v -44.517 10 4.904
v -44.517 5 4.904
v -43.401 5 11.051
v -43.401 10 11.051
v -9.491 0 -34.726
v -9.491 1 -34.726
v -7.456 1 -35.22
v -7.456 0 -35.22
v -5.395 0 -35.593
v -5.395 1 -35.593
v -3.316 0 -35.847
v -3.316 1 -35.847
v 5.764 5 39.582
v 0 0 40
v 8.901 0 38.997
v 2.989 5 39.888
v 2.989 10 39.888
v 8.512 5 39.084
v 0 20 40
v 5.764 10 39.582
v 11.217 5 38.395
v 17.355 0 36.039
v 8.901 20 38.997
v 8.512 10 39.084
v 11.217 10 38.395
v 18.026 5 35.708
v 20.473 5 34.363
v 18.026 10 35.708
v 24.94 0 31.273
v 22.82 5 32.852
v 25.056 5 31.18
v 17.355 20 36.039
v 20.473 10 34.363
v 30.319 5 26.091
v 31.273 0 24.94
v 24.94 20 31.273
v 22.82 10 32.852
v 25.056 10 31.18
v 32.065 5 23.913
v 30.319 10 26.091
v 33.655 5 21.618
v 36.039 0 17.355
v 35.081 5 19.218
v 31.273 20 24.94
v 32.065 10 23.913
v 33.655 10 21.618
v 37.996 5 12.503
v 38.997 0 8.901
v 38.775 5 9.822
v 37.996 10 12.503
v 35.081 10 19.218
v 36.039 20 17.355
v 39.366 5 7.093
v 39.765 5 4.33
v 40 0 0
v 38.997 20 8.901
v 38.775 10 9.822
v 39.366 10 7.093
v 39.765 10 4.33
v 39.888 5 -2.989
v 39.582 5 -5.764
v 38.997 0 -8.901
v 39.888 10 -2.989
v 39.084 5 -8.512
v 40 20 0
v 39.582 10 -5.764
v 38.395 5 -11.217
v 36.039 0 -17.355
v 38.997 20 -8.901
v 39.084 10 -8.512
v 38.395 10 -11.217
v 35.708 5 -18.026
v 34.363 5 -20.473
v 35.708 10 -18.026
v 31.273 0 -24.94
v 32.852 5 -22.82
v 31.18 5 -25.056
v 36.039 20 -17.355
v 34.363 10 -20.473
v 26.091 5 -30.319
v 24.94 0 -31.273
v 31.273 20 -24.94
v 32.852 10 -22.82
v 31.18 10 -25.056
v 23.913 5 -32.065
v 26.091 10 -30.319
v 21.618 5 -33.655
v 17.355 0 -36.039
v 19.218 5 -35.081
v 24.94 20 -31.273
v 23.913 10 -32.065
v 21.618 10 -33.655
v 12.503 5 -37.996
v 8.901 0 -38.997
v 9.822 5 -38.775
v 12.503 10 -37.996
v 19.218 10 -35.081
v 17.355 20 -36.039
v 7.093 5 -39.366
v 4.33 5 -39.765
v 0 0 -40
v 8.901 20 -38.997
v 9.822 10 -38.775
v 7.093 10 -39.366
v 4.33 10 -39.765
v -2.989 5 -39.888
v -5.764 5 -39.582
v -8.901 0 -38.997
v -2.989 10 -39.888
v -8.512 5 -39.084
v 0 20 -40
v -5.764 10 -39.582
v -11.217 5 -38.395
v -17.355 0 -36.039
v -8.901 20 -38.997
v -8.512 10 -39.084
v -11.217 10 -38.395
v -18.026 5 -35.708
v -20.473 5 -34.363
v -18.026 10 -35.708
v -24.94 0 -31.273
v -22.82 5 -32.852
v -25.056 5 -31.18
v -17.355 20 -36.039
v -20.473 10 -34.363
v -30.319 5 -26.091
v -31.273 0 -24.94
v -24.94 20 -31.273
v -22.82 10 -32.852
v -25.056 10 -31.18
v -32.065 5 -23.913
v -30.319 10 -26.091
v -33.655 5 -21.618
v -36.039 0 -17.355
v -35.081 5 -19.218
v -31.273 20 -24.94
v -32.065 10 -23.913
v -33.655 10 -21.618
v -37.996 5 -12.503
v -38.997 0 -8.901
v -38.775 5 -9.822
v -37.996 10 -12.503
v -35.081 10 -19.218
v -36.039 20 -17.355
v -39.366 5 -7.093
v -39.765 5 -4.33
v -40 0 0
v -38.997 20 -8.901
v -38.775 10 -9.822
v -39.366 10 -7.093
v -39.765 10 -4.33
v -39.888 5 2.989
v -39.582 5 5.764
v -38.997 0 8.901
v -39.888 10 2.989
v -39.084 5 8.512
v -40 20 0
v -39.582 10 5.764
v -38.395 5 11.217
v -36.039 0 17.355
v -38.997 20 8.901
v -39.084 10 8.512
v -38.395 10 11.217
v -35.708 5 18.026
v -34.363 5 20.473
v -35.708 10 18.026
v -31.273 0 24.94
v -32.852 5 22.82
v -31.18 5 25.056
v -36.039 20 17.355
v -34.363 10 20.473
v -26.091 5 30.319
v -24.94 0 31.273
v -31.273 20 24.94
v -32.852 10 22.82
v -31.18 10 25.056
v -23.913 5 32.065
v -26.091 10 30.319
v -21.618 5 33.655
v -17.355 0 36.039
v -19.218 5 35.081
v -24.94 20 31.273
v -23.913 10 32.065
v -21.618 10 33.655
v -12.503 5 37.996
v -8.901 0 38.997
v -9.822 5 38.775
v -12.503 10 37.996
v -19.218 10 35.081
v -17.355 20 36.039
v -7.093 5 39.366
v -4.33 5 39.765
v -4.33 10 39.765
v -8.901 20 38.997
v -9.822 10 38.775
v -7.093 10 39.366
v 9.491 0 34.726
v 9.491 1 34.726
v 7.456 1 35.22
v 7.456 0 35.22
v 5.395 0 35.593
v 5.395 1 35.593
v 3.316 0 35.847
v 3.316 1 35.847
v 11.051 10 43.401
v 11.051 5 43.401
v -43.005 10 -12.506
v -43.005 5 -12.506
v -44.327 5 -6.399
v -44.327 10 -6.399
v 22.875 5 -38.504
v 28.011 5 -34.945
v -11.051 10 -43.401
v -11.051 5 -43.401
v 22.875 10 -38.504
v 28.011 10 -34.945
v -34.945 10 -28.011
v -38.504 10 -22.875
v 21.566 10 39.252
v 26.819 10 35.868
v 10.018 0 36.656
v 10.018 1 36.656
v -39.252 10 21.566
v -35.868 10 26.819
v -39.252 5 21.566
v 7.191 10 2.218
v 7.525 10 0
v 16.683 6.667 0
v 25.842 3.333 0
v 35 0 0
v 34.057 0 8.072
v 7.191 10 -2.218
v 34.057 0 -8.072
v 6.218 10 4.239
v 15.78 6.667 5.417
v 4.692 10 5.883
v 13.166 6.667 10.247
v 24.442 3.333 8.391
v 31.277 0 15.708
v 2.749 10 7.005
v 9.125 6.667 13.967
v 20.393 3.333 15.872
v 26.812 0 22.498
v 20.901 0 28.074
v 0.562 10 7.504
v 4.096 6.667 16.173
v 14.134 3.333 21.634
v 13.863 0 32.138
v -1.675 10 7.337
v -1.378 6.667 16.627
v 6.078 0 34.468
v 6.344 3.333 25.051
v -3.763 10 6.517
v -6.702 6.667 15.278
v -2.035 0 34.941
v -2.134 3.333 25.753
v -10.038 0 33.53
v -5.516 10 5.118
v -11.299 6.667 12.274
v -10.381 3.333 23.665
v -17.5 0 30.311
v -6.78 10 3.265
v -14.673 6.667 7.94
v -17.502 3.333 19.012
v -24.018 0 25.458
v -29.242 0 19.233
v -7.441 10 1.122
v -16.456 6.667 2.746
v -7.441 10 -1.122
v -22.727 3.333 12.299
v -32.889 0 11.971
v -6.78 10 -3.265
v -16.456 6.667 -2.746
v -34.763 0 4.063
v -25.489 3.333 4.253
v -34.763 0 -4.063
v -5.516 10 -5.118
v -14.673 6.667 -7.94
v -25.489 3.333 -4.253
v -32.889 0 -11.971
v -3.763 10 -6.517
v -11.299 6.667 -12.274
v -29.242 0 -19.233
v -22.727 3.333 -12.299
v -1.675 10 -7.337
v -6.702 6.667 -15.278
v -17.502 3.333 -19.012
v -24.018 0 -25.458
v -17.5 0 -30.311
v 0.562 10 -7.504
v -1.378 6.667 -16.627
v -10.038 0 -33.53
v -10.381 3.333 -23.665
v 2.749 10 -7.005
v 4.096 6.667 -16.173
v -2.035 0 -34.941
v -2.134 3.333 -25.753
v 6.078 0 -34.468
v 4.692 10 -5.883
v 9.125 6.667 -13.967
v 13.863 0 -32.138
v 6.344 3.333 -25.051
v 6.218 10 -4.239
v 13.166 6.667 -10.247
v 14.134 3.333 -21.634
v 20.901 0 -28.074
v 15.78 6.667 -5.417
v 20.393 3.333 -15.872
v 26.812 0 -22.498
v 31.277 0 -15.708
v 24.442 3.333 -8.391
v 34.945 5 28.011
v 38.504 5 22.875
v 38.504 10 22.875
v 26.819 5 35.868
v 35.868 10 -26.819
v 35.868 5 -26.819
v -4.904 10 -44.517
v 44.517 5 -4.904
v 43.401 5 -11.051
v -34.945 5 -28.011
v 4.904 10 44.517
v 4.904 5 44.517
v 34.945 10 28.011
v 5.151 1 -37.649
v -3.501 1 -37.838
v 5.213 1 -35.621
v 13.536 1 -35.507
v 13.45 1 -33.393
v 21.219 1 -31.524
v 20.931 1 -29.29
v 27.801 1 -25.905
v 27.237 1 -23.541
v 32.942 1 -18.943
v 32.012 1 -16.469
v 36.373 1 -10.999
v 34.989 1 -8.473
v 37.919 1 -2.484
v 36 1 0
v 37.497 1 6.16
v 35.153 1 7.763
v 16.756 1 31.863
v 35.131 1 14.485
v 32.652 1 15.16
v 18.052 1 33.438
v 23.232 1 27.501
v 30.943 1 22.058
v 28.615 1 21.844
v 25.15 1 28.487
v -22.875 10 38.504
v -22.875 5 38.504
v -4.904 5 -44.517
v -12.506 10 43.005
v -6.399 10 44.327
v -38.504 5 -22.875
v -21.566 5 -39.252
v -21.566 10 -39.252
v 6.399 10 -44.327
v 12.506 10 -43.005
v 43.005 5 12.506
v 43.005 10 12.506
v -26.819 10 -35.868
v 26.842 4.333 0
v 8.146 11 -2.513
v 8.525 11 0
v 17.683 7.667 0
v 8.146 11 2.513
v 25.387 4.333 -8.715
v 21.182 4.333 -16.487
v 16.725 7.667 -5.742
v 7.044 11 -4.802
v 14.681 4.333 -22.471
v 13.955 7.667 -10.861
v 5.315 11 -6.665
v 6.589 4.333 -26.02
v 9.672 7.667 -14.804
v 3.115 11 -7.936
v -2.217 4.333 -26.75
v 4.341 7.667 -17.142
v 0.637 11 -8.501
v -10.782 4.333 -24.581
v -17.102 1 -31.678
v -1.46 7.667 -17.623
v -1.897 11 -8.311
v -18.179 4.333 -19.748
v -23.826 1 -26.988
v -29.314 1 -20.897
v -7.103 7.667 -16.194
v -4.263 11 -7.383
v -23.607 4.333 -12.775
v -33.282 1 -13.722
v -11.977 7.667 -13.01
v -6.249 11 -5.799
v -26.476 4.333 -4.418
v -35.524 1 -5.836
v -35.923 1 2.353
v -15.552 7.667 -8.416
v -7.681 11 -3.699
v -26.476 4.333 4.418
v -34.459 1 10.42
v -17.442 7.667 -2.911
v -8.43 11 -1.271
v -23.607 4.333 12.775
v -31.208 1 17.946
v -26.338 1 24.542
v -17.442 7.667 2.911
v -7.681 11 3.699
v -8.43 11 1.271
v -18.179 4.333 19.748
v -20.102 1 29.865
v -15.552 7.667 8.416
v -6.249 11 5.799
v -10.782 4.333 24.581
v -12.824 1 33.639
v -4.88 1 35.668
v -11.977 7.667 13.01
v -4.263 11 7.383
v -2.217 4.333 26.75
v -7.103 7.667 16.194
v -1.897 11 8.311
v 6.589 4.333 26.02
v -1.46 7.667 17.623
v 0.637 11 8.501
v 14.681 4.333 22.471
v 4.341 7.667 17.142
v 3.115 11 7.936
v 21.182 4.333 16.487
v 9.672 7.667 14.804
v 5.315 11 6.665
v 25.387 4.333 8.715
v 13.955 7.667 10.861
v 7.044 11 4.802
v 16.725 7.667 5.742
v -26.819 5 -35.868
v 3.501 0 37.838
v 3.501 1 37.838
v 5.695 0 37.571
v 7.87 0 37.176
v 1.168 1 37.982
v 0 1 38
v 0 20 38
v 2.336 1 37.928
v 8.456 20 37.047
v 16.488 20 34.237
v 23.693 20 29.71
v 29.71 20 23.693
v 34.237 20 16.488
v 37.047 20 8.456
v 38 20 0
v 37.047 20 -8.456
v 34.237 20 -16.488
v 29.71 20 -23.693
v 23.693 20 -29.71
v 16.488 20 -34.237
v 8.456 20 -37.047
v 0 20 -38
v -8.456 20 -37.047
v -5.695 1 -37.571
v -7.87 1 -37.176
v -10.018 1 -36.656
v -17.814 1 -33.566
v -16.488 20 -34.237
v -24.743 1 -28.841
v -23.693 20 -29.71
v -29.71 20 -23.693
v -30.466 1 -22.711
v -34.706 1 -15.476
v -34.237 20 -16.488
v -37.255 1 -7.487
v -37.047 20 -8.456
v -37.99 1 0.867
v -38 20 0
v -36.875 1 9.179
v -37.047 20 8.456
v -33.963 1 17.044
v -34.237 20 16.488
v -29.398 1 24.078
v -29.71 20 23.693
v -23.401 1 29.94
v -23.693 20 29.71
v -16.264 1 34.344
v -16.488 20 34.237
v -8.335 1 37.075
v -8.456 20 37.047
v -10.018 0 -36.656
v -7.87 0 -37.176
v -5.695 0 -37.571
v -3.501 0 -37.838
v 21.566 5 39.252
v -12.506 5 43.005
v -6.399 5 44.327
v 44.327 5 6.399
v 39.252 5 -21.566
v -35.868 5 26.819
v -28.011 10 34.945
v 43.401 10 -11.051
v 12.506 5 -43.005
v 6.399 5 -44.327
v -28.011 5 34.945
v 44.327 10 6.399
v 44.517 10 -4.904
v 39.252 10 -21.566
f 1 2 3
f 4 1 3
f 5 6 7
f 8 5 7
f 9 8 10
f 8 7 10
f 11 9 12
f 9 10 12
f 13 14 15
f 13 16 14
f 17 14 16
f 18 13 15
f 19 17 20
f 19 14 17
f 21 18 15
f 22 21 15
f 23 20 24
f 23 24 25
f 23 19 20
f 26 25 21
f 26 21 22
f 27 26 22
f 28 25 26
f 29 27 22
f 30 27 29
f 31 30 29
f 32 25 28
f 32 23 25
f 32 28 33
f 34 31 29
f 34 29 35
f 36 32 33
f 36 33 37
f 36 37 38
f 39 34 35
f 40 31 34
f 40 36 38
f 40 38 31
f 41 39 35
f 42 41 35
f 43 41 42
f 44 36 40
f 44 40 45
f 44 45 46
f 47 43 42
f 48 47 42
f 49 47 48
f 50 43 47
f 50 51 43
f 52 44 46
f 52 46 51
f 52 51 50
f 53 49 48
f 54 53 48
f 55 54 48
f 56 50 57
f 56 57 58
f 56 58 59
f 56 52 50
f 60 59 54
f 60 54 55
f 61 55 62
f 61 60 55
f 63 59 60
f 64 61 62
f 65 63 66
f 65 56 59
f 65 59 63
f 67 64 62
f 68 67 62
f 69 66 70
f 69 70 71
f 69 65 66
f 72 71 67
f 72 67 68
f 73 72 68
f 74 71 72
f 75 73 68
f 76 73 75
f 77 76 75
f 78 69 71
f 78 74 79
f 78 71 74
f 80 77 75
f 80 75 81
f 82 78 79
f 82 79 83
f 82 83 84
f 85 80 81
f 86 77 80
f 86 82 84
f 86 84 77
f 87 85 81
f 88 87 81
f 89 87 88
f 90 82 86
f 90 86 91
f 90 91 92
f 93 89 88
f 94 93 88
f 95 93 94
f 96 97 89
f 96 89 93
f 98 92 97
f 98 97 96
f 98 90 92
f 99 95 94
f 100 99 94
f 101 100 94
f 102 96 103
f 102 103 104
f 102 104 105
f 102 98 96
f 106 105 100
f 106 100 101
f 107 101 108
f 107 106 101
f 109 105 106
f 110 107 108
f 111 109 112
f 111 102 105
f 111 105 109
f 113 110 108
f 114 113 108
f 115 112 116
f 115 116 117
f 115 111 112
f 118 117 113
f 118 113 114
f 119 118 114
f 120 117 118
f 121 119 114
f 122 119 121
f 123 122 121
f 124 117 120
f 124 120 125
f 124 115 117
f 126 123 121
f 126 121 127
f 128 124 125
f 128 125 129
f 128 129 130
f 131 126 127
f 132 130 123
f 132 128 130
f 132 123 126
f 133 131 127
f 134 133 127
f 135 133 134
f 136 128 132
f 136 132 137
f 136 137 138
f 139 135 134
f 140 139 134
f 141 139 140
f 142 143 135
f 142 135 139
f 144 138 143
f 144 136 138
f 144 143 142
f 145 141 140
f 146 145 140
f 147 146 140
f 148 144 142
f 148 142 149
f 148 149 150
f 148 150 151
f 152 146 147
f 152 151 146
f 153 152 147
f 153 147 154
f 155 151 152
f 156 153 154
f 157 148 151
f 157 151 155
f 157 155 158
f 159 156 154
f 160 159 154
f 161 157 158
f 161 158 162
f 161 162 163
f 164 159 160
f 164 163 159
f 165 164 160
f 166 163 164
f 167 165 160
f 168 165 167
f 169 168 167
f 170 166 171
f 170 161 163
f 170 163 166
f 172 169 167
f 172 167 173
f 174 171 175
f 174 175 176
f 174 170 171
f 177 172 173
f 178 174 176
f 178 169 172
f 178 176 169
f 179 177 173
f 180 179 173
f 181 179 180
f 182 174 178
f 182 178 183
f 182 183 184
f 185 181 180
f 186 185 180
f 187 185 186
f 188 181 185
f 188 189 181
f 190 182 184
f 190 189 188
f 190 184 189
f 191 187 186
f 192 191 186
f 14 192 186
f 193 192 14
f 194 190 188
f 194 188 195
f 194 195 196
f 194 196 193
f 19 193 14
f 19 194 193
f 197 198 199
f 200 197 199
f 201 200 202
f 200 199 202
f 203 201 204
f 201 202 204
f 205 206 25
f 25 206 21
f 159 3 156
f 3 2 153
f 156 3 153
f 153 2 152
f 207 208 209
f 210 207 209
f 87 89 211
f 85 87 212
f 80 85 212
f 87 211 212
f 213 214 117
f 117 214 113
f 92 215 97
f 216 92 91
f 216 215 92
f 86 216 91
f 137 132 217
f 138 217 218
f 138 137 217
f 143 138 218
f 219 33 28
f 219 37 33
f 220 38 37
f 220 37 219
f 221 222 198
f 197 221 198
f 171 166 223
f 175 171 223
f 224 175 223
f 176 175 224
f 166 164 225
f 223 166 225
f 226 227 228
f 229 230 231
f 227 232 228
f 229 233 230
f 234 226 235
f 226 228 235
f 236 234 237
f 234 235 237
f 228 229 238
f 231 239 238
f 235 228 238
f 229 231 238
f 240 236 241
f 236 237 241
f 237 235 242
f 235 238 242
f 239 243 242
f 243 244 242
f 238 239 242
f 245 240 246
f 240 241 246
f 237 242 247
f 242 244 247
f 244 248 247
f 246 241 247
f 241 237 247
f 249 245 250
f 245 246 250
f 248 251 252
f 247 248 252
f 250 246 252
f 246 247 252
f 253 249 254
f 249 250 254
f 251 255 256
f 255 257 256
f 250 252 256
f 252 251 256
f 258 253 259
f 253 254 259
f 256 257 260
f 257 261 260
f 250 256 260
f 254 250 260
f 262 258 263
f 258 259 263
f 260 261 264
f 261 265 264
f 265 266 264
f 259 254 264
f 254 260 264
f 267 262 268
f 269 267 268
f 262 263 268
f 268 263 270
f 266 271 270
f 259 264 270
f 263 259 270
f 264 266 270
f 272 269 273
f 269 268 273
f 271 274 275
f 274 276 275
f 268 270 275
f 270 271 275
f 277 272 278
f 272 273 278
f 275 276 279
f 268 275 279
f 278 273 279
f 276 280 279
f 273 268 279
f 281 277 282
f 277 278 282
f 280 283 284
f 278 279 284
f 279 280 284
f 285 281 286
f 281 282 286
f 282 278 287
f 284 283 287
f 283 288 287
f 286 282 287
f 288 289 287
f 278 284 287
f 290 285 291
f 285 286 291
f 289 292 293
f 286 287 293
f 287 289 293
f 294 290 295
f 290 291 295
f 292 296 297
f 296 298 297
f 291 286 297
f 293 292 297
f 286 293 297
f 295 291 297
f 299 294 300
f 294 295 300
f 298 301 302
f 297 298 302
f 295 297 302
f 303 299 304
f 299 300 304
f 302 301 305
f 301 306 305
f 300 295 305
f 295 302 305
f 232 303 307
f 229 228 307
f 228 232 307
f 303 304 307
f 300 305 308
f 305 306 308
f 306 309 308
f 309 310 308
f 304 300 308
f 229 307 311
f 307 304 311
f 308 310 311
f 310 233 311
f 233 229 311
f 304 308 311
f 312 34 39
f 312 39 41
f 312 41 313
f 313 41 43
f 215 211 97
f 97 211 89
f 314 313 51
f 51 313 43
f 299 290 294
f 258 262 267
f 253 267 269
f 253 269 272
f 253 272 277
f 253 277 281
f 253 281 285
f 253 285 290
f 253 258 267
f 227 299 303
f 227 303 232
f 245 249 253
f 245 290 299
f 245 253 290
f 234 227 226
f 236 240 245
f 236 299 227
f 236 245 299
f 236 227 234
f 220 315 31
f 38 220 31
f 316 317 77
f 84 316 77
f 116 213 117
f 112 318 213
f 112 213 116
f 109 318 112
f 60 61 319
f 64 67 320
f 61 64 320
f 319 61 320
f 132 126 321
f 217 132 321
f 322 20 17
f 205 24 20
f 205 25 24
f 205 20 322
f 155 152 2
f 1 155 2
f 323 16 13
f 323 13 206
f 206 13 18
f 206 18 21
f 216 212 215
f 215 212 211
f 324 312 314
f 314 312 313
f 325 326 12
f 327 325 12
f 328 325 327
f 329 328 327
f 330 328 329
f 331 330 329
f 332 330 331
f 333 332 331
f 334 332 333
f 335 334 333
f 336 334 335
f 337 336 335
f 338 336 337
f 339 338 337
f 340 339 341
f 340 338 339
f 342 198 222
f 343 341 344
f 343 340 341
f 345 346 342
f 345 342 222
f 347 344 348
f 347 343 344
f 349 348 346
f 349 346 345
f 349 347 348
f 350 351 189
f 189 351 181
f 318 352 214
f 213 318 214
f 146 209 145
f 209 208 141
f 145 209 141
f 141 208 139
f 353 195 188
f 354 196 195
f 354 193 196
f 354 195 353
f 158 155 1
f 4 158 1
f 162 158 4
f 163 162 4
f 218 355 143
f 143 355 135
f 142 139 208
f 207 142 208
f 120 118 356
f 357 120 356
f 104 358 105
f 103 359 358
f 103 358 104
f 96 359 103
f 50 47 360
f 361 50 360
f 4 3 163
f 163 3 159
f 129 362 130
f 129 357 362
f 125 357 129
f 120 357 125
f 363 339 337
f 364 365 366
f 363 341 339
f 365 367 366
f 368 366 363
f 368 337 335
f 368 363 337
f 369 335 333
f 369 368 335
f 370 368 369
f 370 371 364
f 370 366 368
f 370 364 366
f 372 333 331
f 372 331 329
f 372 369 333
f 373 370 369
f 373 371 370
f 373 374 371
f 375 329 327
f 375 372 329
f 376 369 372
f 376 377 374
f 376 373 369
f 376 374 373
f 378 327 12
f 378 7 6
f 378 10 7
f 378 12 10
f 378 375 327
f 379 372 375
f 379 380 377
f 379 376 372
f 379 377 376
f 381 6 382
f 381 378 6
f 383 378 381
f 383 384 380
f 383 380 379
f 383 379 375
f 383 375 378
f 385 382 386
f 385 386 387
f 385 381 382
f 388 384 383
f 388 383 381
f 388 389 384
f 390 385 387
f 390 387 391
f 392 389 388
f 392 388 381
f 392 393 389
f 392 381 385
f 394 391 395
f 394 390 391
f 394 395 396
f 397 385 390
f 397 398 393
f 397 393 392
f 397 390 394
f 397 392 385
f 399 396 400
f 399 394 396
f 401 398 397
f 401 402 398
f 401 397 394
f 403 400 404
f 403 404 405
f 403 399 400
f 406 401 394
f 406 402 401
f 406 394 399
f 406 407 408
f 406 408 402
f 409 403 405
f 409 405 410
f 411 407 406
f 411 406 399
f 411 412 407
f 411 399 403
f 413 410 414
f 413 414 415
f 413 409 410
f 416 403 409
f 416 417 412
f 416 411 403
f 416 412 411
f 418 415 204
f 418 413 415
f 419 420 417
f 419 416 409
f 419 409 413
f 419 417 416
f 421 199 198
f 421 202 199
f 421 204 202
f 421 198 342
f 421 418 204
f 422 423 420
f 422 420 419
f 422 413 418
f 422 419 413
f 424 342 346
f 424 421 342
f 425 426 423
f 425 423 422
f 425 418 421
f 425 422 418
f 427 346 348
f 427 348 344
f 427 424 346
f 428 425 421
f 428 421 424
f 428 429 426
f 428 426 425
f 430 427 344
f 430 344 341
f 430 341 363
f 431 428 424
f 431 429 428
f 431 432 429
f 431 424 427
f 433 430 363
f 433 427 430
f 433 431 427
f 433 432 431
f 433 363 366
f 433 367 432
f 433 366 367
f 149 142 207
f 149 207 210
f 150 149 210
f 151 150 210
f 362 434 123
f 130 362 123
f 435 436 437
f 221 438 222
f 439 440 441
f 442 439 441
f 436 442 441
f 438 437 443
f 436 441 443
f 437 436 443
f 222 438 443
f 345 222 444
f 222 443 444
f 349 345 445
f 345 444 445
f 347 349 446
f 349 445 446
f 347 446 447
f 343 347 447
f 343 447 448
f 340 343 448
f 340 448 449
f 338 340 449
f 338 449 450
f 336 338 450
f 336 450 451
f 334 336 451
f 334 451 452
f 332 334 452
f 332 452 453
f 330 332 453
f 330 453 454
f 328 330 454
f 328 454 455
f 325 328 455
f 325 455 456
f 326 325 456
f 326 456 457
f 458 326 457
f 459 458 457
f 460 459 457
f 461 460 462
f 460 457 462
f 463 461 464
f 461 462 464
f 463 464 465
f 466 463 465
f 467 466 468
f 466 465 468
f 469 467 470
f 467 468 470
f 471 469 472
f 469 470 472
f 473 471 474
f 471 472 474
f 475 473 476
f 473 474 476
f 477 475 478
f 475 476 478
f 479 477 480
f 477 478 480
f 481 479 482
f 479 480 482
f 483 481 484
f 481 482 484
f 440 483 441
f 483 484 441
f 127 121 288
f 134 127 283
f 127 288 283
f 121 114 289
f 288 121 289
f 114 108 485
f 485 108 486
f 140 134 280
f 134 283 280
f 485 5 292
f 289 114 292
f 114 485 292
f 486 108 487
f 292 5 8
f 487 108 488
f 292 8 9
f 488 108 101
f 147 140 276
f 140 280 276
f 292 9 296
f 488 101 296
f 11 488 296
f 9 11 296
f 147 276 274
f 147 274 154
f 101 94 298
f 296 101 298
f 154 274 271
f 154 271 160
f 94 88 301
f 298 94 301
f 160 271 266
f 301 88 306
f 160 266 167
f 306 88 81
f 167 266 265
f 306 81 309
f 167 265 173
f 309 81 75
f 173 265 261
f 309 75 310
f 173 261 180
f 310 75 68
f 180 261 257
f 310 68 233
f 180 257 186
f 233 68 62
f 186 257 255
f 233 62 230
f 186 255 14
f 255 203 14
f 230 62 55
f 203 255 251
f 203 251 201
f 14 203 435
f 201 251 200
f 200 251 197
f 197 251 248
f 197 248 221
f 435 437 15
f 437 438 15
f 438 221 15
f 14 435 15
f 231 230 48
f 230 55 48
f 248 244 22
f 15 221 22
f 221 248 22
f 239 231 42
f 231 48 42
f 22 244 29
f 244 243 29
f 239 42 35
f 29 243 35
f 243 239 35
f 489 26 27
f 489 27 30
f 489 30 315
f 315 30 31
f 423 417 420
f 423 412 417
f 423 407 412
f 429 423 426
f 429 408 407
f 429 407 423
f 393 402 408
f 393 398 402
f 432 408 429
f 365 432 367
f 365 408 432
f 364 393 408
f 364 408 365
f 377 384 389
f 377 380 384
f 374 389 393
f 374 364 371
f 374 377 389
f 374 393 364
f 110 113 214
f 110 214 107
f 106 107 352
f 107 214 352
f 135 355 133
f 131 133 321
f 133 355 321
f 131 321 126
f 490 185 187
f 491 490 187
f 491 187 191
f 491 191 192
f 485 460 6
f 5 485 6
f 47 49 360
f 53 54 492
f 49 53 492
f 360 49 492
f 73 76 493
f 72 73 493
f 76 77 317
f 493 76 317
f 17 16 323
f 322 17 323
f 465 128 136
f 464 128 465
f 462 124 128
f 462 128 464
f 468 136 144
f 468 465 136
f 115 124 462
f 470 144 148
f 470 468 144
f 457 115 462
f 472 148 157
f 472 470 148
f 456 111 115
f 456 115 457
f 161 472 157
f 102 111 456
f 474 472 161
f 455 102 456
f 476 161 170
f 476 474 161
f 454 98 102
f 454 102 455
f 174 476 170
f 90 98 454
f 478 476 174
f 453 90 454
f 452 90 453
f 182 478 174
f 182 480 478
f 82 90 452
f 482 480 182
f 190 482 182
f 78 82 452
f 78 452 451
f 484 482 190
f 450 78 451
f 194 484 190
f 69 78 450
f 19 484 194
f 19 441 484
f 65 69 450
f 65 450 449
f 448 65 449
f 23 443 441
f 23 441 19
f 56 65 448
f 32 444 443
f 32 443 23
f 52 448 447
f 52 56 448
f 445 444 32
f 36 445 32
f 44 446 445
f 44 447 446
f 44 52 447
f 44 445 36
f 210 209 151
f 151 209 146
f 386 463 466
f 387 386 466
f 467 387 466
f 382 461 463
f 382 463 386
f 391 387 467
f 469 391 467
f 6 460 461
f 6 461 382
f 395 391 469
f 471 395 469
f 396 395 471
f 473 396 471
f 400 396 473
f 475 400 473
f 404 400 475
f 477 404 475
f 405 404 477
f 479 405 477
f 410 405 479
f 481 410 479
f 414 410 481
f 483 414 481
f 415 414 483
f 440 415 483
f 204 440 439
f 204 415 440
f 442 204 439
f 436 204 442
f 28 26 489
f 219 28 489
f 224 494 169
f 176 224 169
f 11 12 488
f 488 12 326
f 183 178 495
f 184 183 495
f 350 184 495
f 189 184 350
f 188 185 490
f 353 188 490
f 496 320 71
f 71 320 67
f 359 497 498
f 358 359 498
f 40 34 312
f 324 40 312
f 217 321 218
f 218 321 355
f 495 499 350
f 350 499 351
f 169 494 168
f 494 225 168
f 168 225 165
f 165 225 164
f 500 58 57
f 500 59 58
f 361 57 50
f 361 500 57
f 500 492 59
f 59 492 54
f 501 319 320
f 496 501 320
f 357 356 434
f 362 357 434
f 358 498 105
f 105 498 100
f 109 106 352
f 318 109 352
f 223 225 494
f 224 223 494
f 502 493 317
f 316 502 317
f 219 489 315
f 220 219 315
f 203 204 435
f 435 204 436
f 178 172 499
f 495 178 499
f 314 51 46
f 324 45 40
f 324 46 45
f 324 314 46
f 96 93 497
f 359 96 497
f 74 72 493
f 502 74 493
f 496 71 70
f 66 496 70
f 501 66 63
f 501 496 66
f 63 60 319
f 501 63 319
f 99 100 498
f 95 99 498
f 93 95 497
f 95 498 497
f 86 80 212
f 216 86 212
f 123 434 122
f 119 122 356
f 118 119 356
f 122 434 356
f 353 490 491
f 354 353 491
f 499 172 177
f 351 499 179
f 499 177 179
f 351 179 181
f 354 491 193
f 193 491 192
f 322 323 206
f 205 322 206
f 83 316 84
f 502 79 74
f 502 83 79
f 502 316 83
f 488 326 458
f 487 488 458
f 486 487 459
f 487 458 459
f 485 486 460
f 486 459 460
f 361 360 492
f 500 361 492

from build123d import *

# Parameters (mm, degrees)
SKETCH1_R           = 40
BOSS_EXTRUDE1_DEPTH = 10
SKETCH2_R           = 38
CUT_EXTRUDE1_DEPTH  = 9
CUT_EXTRUDE2_DEPTH  = 8
SKETCH4_R           = 36
BOSS_EXTRUDE2_DEPTH = 10
BOSS_EXTRUDE2_TAPER = 70
SKETCH5_R           = 35
CUT_EXTRUDE3_DEPTH  = 10
CUT_EXTRUDE3_DRAFT  = -70
BOSS_EXTRUDE4_START = -5
BOSS_EXTRUDE4_DEPTH = 5
BOSS_EXTRUDE5_START = 10
SKETCH8_R           = 40
SKETCH8_R_2         = 38
BOSS_EXTRUDE5_DEPTH = 10


with BuildPart() as part:
    # Sketch1 → Boss-Extrude1 (new body)
    with BuildSketch(Plane(origin=(0, 0, 0), x_dir=(1, 0, 0), z_dir=(0, 1, 0))):
        with Locations(Location((0, 0, 0), (0, 0, 270))):
            Circle(SKETCH1_R)
    extrude(amount=BOSS_EXTRUDE1_DEPTH)

    # Sketch2 → Cut-Extrude1 (cut)
    with BuildSketch(Plane(origin=(0, 10, 0), x_dir=(1, 0, 0), z_dir=(0, 1, 0))):
        with Locations(Location((0, 0, 0), (0, 0, 270))):
            Circle(SKETCH2_R)
    extrude(amount=-CUT_EXTRUDE1_DEPTH, mode=Mode.SUBTRACT)

    # Sketch3 → Cut-Extrude2 (cut)
    with BuildSketch(Plane(origin=(0, 1, 0), x_dir=(1, 0, 0), z_dir=(0, 1, 0))):
        with BuildLine():
            Line((-10.01806559, 36.655672983), (-9.49079898, 34.726427036))
            ThreePointArc((-9.49079898, 34.726427036), (-6.428076084, 35.421460132), (-3.316431646, 35.846914527))
            Line((-3.316431646, 35.846914527), (-3.500677849, 37.838409779))
            ThreePointArc((-3.500677849, 37.838409779), (-6.785191422, 37.389319028), (-10.01806559, 36.655672983))
        make_face()
        with BuildLine():
            Line((10.01806559, -36.655672983), (9.49079898, -34.726427036))
            ThreePointArc((9.49079898, -34.726427036), (6.428076084, -35.421460132), (3.316431646, -35.846914527))
            Line((3.316431646, -35.846914527), (3.500677849, -37.838409779))
            ThreePointArc((3.500677849, -37.838409779), (6.785191421, -37.389319028), (10.01806559, -36.655672983))
        make_face()
    extrude(amount=-CUT_EXTRUDE2_DEPTH, mode=Mode.SUBTRACT)

    # Sketch4 → Boss-Extrude2 (add)
    with BuildSketch(Plane(origin=(0, 1, 0), x_dir=(1, 0, 0), z_dir=(0, 1, 0))):
        Circle(SKETCH4_R)
    extrude(amount=BOSS_EXTRUDE2_DEPTH, taper=BOSS_EXTRUDE2_TAPER)


with BuildPart() as cut_extrude3_tool:
    # Sketch5 → Cut-Extrude3 (with draft: the straight prism first)
    with BuildSketch(Plane.XZ):
        Circle(SKETCH5_R)
    extrude(amount=-CUT_EXTRUDE3_DEPTH)
    # Cut-Extrude3: the draft: its side faces are tilted about the plane it starts from
    cut_extrude3_sides = [cut_extrude3_tool.faces().sort_by_distance(p)[0] for p in [
        (-35, 5, 0),
    ]]
    draft(cut_extrude3_sides, Plane.XZ, CUT_EXTRUDE3_DRAFT)


with BuildPart() as part_1:
    add(part.part)

    # Cut-Extrude3: cut by cut_extrude3_tool
    add(cut_extrude3_tool.part, mode=Mode.SUBTRACT)

    # Sketch7 → Boss-Extrude4 (add)
    with BuildSketch(Plane(origin=(0, 10, 0), x_dir=(1, 0, 0), z_dir=(0, 1, 0)).offset(BOSS_EXTRUDE4_START)):
        with BuildLine():
            Line((-11.051326445, 43.40114745), (-11.217125783, 38.395000836))
            ThreePointArc((-11.217125783, 38.395000836), (-7.142306759, 39.357177924), (-2.989235129, 39.888149535))
            Line((-2.989235129, 39.888149535), (-4.90350342, 44.516817838))
            Line((-4.90350342, 44.516817838), (-11.051326445, 43.40114745))
        make_face()
        with BuildLine():
            Line((6.398805765, 44.326591353), (4.329857781, 39.764963619))
            ThreePointArc((4.329857781, 39.764963619), (8.462708906, 39.094533607), (12.502840822, 37.995775705))
            Line((12.502840822, 37.995775705), (12.505602201, 43.004666372))
            Line((12.505602201, 43.004666372), (6.398805765, 44.326591353))
        make_face()
        with BuildLine():
            Line((22.874777803, 38.503713544), (19.217659748, 35.081071161))
            ThreePointArc((19.217659748, 35.081071161), (22.779353856, 32.880100941), (26.091472595, 30.318889455))
            Line((26.091472595, 30.318889455), (28.01084325, 34.94544429))
            Line((28.01084325, 34.94544429), (22.874777803, 38.503713544))
        make_face()
        with BuildLine():
            Line((35.868272281, 26.818994385), (31.179747227, 25.05640363))
            ThreePointArc((31.179747227, 25.05640363), (33.628048676, 21.659970966), (35.707914186, 18.026227128))
            Line((35.707914186, 18.026227128), (39.251687333, 21.566095096))
            Line((39.251687333, 21.566095096), (35.868272281, 26.818994385))
        make_face()
        with BuildLine():
            Line((43.40114745, 11.051326445), (38.395000836, 11.217125783))
            ThreePointArc((38.395000836, 11.217125783), (39.357177924, 7.142306759), (39.888149535, 2.989235129))
            Line((39.888149535, 2.989235129), (44.516817838, 4.90350342))
            Line((44.516817838, 4.90350342), (43.40114745, 11.051326445))
        make_face()
        with BuildLine():
            Line((44.326591353, -6.398805765), (39.764963619, -4.329857781))
            ThreePointArc((39.764963619, -4.329857781), (39.094533607, -8.462708906), (37.995775705, -12.502840822))
            Line((37.995775705, -12.502840822), (43.004666372, -12.505602201))
            Line((43.004666372, -12.505602201), (44.326591353, -6.398805765))
        make_face()
        with BuildLine():
            Line((38.503713544, -22.874777803), (35.081071161, -19.217659748))
            ThreePointArc((35.081071161, -19.217659748), (32.880100941, -22.779353856), (30.318889455, -26.091472595))
            Line((30.318889455, -26.091472595), (34.94544429, -28.01084325))
            Line((34.94544429, -28.01084325), (38.503713544, -22.874777803))
        make_face()
        with BuildLine():
            Line((26.818994385, -35.868272281), (25.05640363, -31.179747227))
            ThreePointArc((25.05640363, -31.179747227), (21.659970966, -33.628048676), (18.026227128, -35.707914186))
            Line((18.026227128, -35.707914186), (21.566095096, -39.251687333))
            Line((21.566095096, -39.251687333), (26.818994385, -35.868272281))
        make_face()
        with BuildLine():
            Line((11.051326445, -43.40114745), (11.217125783, -38.395000836))
            ThreePointArc((11.217125783, -38.395000836), (7.142306759, -39.357177924), (2.989235129, -39.888149535))
            Line((2.989235129, -39.888149535), (4.90350342, -44.516817838))
            Line((4.90350342, -44.516817838), (11.051326445, -43.40114745))
        make_face()
        with BuildLine():
            Line((-6.398805765, -44.326591353), (-4.329857781, -39.764963619))
            ThreePointArc((-4.329857781, -39.764963619), (-8.462708906, -39.094533607), (-12.502840822, -37.995775705))
            Line((-12.502840822, -37.995775705), (-12.505602201, -43.004666372))
            Line((-12.505602201, -43.004666372), (-6.398805765, -44.326591353))
        make_face()
        with BuildLine():
            Line((-22.874777803, -38.503713544), (-19.217659748, -35.081071161))
            ThreePointArc((-19.217659748, -35.081071161), (-22.779353856, -32.880100941), (-26.091472595, -30.318889455))
            Line((-26.091472595, -30.318889455), (-28.01084325, -34.94544429))
            Line((-28.01084325, -34.94544429), (-22.874777803, -38.503713544))
        make_face()
        with BuildLine():
            Line((-35.868272281, -26.818994385), (-31.179747227, -25.05640363))
            ThreePointArc((-31.179747227, -25.05640363), (-33.628048676, -21.659970966), (-35.707914186, -18.026227128))
            Line((-35.707914186, -18.026227128), (-39.251687333, -21.566095096))
            Line((-39.251687333, -21.566095096), (-35.868272281, -26.818994385))
        make_face()
        with BuildLine():
            Line((-43.40114745, -11.051326445), (-38.395000836, -11.217125783))
            ThreePointArc((-38.395000836, -11.217125783), (-39.357177924, -7.142306759), (-39.888149535, -2.989235129))
            Line((-39.888149535, -2.989235129), (-44.516817838, -4.90350342))
            Line((-44.516817838, -4.90350342), (-43.40114745, -11.051326445))
        make_face()
        with BuildLine():
            Line((-44.326591353, 6.398805765), (-39.764963619, 4.329857781))
            ThreePointArc((-39.764963619, 4.329857781), (-39.094533607, 8.462708906), (-37.995775705, 12.502840822))
            Line((-37.995775705, 12.502840822), (-43.004666372, 12.505602201))
            Line((-43.004666372, 12.505602201), (-44.326591353, 6.398805765))
        make_face()
        with BuildLine():
            Line((-38.503713544, 22.874777803), (-35.081071161, 19.217659748))
            ThreePointArc((-35.081071161, 19.217659748), (-32.880100941, 22.779353856), (-30.318889455, 26.091472595))
            Line((-30.318889455, 26.091472595), (-34.94544429, 28.01084325))
            Line((-34.94544429, 28.01084325), (-38.503713544, 22.874777803))
        make_face()
        with BuildLine():
            Line((-26.818994385, 35.868272281), (-25.05640363, 31.179747227))
            ThreePointArc((-25.05640363, 31.179747227), (-21.659970966, 33.628048676), (-18.026227128, 35.707914186))
            Line((-18.026227128, 35.707914186), (-21.566095096, 39.251687333))
            Line((-21.566095096, 39.251687333), (-26.818994385, 35.868272281))
        make_face()
    extrude(amount=BOSS_EXTRUDE4_DEPTH)

    # Sketch8 → Boss-Extrude5 (add)
    with BuildSketch(Plane(origin=(0, 10, 0), x_dir=(1, 0, 0), z_dir=(0, 1, 0)).offset(BOSS_EXTRUDE5_START)):
        with Locations(Location((0, 0, 0), (0, 0, 270))):
            Circle(SKETCH8_R)
        with Locations(Location((0, 0, 0), (0, 0, 270))):
            Circle(SKETCH8_R_2, mode=Mode.SUBTRACT)
    extrude(amount=-BOSS_EXTRUDE5_DEPTH)


solid = part_1.part
